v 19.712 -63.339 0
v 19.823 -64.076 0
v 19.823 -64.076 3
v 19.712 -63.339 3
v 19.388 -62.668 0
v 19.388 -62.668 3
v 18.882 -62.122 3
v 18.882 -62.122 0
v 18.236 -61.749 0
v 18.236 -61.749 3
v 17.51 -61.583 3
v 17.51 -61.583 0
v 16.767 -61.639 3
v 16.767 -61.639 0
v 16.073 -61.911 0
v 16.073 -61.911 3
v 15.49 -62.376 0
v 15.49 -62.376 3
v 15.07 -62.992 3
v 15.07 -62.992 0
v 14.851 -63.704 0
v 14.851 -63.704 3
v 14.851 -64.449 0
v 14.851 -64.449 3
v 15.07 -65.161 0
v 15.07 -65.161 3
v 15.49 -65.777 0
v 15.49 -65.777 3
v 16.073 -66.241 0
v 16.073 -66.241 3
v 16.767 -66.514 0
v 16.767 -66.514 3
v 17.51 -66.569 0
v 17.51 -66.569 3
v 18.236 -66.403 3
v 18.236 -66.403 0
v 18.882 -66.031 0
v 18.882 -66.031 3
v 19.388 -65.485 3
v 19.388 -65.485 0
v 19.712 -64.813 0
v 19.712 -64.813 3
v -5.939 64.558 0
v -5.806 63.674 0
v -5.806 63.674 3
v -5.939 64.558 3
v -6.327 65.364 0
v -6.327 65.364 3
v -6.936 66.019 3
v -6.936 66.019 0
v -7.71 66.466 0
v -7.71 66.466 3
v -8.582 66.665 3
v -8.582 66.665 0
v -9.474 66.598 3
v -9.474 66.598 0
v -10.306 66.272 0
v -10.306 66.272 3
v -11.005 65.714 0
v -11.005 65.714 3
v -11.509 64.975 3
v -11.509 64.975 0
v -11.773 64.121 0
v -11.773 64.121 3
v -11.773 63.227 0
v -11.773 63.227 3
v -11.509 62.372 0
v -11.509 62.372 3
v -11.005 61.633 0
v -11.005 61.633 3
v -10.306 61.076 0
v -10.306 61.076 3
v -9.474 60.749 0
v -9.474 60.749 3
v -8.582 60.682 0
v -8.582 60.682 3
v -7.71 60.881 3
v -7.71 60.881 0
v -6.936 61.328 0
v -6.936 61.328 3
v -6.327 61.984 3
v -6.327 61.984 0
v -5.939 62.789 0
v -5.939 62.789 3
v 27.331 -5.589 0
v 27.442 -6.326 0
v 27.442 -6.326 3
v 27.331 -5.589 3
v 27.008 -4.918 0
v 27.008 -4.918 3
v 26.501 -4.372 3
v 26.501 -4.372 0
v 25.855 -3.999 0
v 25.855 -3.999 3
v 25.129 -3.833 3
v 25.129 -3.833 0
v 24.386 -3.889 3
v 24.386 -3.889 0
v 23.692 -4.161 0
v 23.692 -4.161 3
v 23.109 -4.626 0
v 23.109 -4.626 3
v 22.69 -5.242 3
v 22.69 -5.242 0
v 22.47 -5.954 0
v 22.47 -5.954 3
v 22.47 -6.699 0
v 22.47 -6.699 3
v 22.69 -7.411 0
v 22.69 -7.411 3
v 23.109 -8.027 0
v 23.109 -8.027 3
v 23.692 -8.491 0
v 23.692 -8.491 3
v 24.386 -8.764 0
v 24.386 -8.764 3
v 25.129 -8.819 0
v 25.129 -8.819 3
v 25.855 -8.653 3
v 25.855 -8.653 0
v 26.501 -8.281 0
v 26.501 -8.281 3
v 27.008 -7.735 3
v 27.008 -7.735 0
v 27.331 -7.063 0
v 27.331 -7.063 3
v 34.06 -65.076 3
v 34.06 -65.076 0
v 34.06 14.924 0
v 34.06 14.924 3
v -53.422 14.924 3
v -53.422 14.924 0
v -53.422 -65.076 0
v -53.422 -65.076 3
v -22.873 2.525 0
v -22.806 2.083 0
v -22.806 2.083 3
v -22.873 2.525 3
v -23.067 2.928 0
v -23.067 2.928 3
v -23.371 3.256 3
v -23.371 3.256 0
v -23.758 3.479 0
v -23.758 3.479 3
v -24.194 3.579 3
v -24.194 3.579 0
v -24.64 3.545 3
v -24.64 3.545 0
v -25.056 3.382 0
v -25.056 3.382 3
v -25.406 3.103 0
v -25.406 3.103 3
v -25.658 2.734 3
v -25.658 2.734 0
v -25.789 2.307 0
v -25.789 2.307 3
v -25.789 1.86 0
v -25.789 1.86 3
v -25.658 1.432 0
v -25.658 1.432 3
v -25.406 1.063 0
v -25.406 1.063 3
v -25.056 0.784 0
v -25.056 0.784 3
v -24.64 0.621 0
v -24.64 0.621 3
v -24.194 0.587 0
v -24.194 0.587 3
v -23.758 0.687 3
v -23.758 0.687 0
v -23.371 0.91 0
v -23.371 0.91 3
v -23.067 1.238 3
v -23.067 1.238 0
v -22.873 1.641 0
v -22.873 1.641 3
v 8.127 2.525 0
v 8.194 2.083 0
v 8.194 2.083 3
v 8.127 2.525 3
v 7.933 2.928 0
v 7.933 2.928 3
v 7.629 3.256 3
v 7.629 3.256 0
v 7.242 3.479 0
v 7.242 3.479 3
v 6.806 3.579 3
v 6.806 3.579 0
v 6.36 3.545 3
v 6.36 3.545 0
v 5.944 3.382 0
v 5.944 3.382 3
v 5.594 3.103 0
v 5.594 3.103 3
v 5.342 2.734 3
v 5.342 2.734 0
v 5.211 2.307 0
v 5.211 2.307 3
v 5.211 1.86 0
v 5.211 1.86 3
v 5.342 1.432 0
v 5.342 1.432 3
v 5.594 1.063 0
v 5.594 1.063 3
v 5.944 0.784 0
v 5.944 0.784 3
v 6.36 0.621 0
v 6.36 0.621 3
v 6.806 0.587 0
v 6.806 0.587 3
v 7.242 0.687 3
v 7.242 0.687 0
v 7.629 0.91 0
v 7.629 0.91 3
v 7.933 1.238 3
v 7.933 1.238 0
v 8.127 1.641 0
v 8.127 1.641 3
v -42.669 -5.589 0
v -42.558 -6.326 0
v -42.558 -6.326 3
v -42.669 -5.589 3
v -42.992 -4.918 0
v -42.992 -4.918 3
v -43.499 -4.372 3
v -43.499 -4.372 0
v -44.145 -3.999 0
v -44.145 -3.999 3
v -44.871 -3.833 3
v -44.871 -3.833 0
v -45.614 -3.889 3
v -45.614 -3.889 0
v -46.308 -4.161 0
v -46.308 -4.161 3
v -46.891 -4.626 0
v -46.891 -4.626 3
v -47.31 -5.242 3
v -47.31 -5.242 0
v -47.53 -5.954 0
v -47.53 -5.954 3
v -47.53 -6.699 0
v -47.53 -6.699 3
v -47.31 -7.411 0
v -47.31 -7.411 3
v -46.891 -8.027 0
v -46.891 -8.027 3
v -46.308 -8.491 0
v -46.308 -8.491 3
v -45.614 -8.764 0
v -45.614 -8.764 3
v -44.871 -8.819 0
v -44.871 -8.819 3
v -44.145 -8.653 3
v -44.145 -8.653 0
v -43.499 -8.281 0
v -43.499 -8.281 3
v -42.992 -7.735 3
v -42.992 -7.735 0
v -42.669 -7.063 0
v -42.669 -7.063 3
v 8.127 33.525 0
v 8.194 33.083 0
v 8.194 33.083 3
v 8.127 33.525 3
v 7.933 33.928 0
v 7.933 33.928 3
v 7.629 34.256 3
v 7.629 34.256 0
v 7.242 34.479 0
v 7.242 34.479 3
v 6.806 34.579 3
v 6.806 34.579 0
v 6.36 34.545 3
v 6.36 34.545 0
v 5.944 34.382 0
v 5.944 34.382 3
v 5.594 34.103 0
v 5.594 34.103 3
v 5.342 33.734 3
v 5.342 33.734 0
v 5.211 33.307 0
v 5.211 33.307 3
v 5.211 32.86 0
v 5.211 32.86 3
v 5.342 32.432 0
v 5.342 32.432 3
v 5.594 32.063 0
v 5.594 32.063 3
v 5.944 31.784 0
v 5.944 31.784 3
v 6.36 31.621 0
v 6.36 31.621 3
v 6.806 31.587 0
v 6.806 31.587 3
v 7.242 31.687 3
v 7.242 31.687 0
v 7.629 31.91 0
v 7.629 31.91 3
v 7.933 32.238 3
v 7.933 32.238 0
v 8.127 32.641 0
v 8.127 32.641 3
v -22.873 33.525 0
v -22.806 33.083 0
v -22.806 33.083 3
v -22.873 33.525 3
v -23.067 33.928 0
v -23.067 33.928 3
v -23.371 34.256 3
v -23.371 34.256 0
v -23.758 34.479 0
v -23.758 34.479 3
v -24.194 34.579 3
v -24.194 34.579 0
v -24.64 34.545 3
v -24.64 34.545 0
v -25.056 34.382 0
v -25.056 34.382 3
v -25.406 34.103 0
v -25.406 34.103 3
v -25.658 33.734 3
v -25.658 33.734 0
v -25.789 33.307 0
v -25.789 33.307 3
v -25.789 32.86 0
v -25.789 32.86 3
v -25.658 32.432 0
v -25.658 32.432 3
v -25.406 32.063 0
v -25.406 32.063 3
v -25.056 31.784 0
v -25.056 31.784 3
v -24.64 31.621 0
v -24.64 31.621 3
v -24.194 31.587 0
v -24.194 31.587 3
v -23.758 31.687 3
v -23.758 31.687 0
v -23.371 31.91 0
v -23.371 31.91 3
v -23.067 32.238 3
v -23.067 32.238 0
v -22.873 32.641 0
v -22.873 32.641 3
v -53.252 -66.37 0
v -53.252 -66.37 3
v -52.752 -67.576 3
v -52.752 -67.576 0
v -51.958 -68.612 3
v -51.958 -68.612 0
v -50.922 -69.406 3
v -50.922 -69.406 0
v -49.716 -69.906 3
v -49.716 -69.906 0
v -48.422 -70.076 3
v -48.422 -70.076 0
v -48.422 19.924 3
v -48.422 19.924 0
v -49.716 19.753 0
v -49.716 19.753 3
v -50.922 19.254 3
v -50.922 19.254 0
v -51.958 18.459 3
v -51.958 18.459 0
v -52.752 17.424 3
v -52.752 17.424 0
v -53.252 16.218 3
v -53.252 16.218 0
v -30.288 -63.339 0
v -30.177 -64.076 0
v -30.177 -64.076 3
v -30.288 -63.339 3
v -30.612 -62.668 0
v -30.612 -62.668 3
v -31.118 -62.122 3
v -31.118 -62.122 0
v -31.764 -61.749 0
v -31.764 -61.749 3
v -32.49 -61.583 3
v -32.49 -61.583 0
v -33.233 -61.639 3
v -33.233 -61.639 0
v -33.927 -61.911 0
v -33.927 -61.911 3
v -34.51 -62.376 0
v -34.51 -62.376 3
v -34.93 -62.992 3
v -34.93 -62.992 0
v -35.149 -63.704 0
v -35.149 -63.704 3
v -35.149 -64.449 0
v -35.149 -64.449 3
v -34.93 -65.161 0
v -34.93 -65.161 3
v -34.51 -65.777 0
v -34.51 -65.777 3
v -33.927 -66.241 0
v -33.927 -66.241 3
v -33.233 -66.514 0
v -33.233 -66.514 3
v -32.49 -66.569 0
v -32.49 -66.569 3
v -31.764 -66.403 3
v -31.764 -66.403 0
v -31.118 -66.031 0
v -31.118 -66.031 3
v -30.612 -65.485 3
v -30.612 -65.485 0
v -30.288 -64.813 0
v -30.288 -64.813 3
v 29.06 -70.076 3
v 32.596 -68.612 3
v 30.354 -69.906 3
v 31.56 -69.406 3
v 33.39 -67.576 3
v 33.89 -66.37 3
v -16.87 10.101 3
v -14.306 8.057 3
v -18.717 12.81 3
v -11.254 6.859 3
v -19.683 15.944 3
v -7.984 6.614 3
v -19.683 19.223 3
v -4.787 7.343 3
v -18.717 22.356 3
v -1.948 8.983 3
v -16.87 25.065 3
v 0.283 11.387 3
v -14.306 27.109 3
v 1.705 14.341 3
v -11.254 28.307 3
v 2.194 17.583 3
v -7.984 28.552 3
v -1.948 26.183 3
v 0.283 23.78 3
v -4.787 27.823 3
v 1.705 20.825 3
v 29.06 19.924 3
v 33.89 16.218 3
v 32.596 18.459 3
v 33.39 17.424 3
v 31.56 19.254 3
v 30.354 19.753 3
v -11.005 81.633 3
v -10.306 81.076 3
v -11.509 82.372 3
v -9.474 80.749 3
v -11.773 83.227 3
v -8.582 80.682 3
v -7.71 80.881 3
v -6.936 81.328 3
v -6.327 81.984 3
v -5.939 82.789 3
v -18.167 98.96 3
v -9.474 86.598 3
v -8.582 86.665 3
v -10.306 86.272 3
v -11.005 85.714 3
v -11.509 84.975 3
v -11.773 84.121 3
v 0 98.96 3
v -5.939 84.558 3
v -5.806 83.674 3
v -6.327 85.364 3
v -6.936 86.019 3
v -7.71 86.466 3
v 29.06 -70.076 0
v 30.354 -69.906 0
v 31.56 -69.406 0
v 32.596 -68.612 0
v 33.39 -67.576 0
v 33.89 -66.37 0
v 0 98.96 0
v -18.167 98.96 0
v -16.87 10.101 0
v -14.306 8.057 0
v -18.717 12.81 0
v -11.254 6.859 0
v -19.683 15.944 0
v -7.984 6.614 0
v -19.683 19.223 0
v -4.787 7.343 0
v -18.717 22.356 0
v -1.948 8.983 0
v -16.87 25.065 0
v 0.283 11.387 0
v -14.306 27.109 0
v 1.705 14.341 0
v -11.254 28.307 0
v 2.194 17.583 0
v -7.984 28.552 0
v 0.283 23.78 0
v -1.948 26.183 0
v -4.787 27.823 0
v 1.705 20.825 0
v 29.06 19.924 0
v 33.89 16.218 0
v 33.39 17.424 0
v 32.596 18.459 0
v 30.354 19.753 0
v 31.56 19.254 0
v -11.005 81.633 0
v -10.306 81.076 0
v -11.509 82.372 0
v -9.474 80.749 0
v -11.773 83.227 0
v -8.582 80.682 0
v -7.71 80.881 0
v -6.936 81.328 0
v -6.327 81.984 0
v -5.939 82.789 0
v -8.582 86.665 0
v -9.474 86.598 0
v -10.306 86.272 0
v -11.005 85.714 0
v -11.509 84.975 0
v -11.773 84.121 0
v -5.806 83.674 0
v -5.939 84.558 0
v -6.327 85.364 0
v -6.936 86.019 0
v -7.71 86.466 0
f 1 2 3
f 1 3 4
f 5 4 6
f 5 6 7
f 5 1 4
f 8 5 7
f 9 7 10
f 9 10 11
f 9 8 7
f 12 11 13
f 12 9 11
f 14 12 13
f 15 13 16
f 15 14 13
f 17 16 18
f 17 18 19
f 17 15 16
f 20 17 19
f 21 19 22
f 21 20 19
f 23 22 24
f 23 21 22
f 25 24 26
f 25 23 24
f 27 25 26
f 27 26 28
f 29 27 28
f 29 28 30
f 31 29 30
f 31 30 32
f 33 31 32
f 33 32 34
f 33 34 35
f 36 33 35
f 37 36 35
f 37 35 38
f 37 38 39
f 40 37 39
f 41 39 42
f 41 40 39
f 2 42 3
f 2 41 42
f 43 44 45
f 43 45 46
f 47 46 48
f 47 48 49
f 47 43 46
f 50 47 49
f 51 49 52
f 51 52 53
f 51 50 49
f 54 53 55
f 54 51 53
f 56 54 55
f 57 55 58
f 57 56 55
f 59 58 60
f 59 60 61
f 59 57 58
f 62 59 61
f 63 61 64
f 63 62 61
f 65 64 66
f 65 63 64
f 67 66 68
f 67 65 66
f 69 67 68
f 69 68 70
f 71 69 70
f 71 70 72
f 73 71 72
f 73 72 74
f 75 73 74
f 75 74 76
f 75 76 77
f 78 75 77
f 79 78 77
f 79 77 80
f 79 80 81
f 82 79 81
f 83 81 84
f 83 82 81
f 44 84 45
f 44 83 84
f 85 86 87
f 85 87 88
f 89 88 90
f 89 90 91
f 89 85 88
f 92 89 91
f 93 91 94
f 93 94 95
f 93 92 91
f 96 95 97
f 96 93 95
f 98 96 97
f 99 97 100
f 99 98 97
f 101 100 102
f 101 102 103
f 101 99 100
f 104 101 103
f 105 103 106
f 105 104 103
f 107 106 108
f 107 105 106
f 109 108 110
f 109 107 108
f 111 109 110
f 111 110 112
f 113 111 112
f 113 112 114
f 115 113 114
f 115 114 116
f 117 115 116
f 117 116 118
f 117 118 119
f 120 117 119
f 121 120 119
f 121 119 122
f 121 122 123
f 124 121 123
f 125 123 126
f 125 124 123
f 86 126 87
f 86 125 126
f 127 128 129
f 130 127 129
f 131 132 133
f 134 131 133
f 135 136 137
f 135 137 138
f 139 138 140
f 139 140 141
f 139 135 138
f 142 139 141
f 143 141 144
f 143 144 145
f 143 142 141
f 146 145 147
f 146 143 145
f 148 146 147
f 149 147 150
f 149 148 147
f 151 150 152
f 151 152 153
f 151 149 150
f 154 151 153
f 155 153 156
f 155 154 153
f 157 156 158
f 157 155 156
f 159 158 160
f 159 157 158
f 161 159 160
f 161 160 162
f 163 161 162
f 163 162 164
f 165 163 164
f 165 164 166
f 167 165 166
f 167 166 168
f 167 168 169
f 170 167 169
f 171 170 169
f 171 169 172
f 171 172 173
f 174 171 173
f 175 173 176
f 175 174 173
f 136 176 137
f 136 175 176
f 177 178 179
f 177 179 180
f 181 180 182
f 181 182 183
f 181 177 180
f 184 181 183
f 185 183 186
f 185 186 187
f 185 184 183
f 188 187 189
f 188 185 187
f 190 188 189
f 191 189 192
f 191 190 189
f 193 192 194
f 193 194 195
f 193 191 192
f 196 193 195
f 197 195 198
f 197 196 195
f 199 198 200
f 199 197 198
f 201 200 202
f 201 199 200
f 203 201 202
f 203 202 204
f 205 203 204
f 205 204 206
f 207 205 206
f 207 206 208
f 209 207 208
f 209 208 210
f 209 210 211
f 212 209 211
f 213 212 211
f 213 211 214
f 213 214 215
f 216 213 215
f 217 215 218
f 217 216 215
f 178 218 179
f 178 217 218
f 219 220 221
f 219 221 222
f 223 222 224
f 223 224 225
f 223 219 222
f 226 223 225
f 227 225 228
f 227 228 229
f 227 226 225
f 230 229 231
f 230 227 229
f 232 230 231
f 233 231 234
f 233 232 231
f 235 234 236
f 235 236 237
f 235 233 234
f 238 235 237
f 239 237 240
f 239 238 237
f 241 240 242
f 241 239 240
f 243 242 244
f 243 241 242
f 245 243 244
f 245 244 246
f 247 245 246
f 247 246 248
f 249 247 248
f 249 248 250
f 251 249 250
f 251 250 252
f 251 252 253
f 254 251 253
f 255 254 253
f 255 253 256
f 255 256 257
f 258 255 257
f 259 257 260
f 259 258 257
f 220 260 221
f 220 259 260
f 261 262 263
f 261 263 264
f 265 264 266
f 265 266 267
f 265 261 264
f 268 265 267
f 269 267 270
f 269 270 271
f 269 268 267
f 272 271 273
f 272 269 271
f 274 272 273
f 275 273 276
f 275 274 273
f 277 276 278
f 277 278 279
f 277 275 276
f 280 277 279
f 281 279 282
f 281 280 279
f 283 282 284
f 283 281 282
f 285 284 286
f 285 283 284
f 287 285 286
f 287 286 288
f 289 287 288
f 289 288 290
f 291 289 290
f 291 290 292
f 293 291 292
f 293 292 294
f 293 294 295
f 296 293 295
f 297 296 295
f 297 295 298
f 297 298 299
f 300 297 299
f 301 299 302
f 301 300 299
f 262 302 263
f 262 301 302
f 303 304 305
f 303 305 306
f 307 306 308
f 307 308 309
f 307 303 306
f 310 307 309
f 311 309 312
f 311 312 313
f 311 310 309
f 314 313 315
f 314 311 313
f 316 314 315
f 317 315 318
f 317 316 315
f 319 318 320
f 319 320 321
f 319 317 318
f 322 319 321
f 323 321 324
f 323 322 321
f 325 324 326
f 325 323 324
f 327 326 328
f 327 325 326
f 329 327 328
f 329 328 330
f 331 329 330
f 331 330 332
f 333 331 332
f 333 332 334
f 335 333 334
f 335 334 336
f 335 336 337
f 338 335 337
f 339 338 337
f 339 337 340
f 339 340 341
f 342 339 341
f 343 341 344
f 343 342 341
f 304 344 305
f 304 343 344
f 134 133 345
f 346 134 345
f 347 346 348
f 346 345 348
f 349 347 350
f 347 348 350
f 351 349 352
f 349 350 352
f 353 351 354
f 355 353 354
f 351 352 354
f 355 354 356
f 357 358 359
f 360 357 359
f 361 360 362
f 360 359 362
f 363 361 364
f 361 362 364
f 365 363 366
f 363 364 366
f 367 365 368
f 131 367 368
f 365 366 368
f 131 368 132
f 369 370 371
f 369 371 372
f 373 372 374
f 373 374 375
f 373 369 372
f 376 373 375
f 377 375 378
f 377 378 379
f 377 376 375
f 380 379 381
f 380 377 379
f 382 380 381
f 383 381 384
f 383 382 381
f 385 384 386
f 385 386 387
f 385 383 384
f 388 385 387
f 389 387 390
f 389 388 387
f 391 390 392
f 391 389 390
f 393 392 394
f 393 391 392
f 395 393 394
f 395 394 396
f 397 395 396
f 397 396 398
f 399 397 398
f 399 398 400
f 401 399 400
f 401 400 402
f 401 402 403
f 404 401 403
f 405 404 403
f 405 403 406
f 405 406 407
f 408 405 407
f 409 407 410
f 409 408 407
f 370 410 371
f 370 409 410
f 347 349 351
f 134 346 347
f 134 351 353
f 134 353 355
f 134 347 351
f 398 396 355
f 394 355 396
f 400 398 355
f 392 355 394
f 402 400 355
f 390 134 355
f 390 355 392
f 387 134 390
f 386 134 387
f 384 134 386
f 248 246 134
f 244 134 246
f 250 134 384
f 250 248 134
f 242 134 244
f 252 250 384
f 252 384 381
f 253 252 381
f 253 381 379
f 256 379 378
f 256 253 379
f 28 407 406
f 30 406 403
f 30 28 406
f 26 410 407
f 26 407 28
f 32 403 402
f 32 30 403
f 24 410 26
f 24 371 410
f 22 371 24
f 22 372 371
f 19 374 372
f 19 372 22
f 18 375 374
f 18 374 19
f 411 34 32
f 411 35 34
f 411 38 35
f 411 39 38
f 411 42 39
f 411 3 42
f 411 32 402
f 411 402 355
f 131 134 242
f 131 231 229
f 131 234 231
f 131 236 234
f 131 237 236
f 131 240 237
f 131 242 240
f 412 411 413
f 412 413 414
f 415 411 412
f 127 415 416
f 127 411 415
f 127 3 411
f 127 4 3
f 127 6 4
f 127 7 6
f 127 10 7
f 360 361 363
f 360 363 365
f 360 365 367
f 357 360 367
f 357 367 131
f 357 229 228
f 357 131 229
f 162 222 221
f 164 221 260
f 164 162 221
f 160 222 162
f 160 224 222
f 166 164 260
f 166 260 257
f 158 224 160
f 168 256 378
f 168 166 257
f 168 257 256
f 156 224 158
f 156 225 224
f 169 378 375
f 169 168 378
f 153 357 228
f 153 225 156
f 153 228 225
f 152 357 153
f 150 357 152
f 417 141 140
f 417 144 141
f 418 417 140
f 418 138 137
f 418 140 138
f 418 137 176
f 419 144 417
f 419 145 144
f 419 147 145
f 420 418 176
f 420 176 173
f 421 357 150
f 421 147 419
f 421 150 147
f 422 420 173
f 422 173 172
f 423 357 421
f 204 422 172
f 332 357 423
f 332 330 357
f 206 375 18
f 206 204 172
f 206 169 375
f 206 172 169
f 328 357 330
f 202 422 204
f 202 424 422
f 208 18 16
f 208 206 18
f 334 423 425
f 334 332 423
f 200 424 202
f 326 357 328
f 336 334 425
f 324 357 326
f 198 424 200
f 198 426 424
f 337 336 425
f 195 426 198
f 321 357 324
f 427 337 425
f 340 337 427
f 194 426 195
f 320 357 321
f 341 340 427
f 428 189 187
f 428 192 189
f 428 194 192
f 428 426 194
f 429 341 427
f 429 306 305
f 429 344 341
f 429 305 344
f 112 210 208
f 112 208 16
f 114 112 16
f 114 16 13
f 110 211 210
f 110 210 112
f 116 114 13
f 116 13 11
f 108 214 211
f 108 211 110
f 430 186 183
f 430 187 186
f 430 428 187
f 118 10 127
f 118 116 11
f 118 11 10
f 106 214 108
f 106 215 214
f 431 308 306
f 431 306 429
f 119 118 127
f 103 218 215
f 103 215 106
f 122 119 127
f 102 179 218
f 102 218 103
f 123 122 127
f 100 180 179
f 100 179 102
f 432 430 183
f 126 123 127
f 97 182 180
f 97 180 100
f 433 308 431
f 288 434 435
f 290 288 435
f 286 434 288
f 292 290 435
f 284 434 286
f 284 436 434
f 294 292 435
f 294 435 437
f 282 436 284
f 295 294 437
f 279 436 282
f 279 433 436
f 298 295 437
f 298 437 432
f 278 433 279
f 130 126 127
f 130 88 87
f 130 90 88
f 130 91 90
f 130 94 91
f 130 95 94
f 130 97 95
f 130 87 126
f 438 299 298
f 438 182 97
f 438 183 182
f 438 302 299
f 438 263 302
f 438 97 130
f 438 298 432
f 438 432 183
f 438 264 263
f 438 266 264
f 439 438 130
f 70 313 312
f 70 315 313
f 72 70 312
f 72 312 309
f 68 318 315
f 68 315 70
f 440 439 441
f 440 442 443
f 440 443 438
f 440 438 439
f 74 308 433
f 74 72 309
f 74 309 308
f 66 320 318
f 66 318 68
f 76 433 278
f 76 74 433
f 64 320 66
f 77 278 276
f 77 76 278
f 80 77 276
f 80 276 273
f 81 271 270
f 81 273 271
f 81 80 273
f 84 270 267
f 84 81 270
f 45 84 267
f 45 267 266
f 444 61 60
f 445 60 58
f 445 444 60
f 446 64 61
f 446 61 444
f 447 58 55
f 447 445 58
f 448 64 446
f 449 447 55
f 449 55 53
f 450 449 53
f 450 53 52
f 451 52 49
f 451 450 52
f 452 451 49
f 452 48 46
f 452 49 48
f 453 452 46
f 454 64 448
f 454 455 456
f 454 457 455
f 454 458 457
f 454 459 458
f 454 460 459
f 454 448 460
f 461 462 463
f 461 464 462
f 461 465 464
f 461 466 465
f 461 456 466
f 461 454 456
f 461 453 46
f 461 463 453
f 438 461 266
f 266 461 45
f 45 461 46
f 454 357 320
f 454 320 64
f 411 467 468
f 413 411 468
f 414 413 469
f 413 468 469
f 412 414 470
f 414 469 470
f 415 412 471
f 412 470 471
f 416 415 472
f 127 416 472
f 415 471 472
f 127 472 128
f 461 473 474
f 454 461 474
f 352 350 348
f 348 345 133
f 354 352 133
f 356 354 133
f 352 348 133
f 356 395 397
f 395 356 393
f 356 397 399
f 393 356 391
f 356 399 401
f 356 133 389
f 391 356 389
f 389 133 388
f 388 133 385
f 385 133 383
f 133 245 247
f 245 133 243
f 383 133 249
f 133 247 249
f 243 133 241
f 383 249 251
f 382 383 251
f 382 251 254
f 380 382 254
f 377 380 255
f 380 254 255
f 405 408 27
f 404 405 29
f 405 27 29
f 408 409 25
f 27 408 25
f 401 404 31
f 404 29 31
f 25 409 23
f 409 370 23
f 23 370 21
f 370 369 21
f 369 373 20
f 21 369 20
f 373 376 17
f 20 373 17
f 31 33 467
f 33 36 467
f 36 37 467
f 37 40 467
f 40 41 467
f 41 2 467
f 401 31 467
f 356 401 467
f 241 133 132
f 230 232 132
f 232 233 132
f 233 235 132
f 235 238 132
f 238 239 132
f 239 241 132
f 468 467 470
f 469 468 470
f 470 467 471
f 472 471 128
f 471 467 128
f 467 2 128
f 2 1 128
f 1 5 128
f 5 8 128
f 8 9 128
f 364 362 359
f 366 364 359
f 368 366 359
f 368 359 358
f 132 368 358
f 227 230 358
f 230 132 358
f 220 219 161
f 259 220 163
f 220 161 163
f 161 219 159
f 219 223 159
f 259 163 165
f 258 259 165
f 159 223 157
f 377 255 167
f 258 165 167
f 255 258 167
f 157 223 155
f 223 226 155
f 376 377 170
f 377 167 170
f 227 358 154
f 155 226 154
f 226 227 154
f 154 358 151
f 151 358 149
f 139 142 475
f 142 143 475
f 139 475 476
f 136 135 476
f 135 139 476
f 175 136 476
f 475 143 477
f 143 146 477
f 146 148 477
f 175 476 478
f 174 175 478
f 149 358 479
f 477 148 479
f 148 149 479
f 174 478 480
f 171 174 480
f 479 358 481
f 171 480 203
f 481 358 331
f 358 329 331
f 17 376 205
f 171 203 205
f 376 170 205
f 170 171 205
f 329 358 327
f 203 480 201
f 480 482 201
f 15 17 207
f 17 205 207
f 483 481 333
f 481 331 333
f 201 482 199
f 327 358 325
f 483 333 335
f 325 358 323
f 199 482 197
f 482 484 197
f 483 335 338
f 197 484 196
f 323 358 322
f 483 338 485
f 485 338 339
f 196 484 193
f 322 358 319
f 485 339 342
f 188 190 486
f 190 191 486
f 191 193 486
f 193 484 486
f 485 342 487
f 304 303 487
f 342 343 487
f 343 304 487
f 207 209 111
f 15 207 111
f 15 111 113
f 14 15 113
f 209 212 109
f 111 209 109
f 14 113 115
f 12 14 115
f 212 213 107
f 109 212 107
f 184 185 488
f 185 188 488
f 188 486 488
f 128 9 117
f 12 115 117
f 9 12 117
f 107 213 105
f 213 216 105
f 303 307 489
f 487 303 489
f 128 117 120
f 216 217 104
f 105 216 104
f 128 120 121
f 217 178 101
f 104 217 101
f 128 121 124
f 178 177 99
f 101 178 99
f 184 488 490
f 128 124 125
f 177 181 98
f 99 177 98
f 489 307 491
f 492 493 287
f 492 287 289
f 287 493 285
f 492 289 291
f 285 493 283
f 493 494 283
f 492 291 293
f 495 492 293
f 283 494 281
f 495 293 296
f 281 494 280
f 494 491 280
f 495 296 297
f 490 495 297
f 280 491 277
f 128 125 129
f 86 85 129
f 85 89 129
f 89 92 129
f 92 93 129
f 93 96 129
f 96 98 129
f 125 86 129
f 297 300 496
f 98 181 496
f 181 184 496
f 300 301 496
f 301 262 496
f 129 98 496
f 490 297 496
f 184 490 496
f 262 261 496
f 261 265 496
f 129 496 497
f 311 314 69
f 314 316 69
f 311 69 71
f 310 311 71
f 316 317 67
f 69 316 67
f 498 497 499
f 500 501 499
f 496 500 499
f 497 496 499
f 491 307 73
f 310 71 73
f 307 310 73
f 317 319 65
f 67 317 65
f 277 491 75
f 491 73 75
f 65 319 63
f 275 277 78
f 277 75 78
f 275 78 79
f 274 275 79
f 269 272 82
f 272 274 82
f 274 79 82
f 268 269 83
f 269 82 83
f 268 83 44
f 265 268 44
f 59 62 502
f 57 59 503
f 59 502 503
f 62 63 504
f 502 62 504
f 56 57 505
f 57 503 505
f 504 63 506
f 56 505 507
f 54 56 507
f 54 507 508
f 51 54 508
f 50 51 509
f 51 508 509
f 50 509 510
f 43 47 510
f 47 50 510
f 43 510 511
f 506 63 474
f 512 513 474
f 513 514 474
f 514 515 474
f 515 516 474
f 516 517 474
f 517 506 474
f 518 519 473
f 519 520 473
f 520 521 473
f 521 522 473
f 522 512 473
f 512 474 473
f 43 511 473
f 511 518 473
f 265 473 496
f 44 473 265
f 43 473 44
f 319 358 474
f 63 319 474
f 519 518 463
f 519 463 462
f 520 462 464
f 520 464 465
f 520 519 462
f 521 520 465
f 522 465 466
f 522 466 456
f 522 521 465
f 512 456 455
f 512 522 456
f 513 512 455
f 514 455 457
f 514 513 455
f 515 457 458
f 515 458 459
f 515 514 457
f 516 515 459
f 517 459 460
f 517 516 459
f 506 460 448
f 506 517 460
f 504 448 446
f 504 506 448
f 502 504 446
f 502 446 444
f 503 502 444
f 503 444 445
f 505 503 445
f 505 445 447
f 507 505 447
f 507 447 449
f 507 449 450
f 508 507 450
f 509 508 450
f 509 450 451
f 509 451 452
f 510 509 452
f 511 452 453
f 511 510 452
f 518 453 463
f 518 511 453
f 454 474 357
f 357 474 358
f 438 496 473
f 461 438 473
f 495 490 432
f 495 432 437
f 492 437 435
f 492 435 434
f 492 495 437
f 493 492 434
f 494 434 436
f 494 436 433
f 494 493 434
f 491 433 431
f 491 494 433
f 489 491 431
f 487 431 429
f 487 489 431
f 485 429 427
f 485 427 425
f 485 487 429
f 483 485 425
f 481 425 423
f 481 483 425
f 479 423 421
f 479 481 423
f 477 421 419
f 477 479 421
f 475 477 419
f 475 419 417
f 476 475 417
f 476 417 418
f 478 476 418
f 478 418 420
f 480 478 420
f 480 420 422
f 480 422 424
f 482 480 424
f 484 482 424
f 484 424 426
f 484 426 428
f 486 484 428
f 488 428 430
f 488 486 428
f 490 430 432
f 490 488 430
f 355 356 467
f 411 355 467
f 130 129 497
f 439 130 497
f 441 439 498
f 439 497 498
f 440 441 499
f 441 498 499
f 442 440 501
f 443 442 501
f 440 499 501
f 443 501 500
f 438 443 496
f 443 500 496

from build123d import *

# Parameters (mm, degrees)
F0_R     = 2.5
F0_R_2   = 1.5
F0_R_3   = 11
F0_R_4   = 3
F1_DEPTH = 3


with BuildPart() as f1:
    # F0 (on Top) → F1 (new body)
    with BuildSketch(Plane.XY):
        with BuildLine():
            Line((-48.422295, -70.076307), (29.060322, -70.076307))
            ThreePointArc((29.060322, -70.076307), (32.595856, -68.611841), (34.060322, -65.076307))
            Line((34.060322, -65.076307), (34.060322, 14.923693))
            ThreePointArc((34.060322, 14.923693), (32.595856, 18.459226), (29.060322, 19.923693))
            Line((29.060322, 19.923693), (0, 98.959506))
            Line((0, 98.959506), (-18.166697, 98.959506))
            Line((-18.166697, 98.959506), (-48.422295, 19.923693))
            ThreePointArc((-48.422295, 19.923693), (-51.957828, 18.459226), (-53.422295, 14.923693))
            Line((-53.422295, 14.923693), (-53.422295, -65.076307))
            ThreePointArc((-53.422295, -65.076307), (-51.957828, -68.611841), (-48.422295, -70.076307))
        make_face()
        with Locations((-32.677192, -64.076307)):
            Circle(F0_R, mode=Mode.SUBTRACT)
        with Locations((-45.05799, -6.326307)):
            Circle(F0_R, mode=Mode.SUBTRACT)
        with Locations((-24.306103, 2.083096)):
            Circle(F0_R_2, mode=Mode.SUBTRACT)
        with Locations((17.322808, -64.076307)):
            Circle(F0_R, mode=Mode.SUBTRACT)
        with Locations((6.693897, 2.083096)):
            Circle(F0_R_2, mode=Mode.SUBTRACT)
        with Locations((24.94201, -6.326307)):
            Circle(F0_R, mode=Mode.SUBTRACT)
        with Locations((-24.306103, 33.083096)):
            Circle(F0_R_2, mode=Mode.SUBTRACT)
        with Locations((-8.806103, 17.583096)):
            Circle(F0_R_3, mode=Mode.SUBTRACT)
        with Locations((6.693897, 33.083096)):
            Circle(F0_R_2, mode=Mode.SUBTRACT)
        with Locations((-8.806103, 63.673693)):
            Circle(F0_R_4, mode=Mode.SUBTRACT)
        with Locations((-8.806103, 83.673693)):
            Circle(F0_R_4, mode=Mode.SUBTRACT)
    extrude(amount=F1_DEPTH)


solid = f1.part
